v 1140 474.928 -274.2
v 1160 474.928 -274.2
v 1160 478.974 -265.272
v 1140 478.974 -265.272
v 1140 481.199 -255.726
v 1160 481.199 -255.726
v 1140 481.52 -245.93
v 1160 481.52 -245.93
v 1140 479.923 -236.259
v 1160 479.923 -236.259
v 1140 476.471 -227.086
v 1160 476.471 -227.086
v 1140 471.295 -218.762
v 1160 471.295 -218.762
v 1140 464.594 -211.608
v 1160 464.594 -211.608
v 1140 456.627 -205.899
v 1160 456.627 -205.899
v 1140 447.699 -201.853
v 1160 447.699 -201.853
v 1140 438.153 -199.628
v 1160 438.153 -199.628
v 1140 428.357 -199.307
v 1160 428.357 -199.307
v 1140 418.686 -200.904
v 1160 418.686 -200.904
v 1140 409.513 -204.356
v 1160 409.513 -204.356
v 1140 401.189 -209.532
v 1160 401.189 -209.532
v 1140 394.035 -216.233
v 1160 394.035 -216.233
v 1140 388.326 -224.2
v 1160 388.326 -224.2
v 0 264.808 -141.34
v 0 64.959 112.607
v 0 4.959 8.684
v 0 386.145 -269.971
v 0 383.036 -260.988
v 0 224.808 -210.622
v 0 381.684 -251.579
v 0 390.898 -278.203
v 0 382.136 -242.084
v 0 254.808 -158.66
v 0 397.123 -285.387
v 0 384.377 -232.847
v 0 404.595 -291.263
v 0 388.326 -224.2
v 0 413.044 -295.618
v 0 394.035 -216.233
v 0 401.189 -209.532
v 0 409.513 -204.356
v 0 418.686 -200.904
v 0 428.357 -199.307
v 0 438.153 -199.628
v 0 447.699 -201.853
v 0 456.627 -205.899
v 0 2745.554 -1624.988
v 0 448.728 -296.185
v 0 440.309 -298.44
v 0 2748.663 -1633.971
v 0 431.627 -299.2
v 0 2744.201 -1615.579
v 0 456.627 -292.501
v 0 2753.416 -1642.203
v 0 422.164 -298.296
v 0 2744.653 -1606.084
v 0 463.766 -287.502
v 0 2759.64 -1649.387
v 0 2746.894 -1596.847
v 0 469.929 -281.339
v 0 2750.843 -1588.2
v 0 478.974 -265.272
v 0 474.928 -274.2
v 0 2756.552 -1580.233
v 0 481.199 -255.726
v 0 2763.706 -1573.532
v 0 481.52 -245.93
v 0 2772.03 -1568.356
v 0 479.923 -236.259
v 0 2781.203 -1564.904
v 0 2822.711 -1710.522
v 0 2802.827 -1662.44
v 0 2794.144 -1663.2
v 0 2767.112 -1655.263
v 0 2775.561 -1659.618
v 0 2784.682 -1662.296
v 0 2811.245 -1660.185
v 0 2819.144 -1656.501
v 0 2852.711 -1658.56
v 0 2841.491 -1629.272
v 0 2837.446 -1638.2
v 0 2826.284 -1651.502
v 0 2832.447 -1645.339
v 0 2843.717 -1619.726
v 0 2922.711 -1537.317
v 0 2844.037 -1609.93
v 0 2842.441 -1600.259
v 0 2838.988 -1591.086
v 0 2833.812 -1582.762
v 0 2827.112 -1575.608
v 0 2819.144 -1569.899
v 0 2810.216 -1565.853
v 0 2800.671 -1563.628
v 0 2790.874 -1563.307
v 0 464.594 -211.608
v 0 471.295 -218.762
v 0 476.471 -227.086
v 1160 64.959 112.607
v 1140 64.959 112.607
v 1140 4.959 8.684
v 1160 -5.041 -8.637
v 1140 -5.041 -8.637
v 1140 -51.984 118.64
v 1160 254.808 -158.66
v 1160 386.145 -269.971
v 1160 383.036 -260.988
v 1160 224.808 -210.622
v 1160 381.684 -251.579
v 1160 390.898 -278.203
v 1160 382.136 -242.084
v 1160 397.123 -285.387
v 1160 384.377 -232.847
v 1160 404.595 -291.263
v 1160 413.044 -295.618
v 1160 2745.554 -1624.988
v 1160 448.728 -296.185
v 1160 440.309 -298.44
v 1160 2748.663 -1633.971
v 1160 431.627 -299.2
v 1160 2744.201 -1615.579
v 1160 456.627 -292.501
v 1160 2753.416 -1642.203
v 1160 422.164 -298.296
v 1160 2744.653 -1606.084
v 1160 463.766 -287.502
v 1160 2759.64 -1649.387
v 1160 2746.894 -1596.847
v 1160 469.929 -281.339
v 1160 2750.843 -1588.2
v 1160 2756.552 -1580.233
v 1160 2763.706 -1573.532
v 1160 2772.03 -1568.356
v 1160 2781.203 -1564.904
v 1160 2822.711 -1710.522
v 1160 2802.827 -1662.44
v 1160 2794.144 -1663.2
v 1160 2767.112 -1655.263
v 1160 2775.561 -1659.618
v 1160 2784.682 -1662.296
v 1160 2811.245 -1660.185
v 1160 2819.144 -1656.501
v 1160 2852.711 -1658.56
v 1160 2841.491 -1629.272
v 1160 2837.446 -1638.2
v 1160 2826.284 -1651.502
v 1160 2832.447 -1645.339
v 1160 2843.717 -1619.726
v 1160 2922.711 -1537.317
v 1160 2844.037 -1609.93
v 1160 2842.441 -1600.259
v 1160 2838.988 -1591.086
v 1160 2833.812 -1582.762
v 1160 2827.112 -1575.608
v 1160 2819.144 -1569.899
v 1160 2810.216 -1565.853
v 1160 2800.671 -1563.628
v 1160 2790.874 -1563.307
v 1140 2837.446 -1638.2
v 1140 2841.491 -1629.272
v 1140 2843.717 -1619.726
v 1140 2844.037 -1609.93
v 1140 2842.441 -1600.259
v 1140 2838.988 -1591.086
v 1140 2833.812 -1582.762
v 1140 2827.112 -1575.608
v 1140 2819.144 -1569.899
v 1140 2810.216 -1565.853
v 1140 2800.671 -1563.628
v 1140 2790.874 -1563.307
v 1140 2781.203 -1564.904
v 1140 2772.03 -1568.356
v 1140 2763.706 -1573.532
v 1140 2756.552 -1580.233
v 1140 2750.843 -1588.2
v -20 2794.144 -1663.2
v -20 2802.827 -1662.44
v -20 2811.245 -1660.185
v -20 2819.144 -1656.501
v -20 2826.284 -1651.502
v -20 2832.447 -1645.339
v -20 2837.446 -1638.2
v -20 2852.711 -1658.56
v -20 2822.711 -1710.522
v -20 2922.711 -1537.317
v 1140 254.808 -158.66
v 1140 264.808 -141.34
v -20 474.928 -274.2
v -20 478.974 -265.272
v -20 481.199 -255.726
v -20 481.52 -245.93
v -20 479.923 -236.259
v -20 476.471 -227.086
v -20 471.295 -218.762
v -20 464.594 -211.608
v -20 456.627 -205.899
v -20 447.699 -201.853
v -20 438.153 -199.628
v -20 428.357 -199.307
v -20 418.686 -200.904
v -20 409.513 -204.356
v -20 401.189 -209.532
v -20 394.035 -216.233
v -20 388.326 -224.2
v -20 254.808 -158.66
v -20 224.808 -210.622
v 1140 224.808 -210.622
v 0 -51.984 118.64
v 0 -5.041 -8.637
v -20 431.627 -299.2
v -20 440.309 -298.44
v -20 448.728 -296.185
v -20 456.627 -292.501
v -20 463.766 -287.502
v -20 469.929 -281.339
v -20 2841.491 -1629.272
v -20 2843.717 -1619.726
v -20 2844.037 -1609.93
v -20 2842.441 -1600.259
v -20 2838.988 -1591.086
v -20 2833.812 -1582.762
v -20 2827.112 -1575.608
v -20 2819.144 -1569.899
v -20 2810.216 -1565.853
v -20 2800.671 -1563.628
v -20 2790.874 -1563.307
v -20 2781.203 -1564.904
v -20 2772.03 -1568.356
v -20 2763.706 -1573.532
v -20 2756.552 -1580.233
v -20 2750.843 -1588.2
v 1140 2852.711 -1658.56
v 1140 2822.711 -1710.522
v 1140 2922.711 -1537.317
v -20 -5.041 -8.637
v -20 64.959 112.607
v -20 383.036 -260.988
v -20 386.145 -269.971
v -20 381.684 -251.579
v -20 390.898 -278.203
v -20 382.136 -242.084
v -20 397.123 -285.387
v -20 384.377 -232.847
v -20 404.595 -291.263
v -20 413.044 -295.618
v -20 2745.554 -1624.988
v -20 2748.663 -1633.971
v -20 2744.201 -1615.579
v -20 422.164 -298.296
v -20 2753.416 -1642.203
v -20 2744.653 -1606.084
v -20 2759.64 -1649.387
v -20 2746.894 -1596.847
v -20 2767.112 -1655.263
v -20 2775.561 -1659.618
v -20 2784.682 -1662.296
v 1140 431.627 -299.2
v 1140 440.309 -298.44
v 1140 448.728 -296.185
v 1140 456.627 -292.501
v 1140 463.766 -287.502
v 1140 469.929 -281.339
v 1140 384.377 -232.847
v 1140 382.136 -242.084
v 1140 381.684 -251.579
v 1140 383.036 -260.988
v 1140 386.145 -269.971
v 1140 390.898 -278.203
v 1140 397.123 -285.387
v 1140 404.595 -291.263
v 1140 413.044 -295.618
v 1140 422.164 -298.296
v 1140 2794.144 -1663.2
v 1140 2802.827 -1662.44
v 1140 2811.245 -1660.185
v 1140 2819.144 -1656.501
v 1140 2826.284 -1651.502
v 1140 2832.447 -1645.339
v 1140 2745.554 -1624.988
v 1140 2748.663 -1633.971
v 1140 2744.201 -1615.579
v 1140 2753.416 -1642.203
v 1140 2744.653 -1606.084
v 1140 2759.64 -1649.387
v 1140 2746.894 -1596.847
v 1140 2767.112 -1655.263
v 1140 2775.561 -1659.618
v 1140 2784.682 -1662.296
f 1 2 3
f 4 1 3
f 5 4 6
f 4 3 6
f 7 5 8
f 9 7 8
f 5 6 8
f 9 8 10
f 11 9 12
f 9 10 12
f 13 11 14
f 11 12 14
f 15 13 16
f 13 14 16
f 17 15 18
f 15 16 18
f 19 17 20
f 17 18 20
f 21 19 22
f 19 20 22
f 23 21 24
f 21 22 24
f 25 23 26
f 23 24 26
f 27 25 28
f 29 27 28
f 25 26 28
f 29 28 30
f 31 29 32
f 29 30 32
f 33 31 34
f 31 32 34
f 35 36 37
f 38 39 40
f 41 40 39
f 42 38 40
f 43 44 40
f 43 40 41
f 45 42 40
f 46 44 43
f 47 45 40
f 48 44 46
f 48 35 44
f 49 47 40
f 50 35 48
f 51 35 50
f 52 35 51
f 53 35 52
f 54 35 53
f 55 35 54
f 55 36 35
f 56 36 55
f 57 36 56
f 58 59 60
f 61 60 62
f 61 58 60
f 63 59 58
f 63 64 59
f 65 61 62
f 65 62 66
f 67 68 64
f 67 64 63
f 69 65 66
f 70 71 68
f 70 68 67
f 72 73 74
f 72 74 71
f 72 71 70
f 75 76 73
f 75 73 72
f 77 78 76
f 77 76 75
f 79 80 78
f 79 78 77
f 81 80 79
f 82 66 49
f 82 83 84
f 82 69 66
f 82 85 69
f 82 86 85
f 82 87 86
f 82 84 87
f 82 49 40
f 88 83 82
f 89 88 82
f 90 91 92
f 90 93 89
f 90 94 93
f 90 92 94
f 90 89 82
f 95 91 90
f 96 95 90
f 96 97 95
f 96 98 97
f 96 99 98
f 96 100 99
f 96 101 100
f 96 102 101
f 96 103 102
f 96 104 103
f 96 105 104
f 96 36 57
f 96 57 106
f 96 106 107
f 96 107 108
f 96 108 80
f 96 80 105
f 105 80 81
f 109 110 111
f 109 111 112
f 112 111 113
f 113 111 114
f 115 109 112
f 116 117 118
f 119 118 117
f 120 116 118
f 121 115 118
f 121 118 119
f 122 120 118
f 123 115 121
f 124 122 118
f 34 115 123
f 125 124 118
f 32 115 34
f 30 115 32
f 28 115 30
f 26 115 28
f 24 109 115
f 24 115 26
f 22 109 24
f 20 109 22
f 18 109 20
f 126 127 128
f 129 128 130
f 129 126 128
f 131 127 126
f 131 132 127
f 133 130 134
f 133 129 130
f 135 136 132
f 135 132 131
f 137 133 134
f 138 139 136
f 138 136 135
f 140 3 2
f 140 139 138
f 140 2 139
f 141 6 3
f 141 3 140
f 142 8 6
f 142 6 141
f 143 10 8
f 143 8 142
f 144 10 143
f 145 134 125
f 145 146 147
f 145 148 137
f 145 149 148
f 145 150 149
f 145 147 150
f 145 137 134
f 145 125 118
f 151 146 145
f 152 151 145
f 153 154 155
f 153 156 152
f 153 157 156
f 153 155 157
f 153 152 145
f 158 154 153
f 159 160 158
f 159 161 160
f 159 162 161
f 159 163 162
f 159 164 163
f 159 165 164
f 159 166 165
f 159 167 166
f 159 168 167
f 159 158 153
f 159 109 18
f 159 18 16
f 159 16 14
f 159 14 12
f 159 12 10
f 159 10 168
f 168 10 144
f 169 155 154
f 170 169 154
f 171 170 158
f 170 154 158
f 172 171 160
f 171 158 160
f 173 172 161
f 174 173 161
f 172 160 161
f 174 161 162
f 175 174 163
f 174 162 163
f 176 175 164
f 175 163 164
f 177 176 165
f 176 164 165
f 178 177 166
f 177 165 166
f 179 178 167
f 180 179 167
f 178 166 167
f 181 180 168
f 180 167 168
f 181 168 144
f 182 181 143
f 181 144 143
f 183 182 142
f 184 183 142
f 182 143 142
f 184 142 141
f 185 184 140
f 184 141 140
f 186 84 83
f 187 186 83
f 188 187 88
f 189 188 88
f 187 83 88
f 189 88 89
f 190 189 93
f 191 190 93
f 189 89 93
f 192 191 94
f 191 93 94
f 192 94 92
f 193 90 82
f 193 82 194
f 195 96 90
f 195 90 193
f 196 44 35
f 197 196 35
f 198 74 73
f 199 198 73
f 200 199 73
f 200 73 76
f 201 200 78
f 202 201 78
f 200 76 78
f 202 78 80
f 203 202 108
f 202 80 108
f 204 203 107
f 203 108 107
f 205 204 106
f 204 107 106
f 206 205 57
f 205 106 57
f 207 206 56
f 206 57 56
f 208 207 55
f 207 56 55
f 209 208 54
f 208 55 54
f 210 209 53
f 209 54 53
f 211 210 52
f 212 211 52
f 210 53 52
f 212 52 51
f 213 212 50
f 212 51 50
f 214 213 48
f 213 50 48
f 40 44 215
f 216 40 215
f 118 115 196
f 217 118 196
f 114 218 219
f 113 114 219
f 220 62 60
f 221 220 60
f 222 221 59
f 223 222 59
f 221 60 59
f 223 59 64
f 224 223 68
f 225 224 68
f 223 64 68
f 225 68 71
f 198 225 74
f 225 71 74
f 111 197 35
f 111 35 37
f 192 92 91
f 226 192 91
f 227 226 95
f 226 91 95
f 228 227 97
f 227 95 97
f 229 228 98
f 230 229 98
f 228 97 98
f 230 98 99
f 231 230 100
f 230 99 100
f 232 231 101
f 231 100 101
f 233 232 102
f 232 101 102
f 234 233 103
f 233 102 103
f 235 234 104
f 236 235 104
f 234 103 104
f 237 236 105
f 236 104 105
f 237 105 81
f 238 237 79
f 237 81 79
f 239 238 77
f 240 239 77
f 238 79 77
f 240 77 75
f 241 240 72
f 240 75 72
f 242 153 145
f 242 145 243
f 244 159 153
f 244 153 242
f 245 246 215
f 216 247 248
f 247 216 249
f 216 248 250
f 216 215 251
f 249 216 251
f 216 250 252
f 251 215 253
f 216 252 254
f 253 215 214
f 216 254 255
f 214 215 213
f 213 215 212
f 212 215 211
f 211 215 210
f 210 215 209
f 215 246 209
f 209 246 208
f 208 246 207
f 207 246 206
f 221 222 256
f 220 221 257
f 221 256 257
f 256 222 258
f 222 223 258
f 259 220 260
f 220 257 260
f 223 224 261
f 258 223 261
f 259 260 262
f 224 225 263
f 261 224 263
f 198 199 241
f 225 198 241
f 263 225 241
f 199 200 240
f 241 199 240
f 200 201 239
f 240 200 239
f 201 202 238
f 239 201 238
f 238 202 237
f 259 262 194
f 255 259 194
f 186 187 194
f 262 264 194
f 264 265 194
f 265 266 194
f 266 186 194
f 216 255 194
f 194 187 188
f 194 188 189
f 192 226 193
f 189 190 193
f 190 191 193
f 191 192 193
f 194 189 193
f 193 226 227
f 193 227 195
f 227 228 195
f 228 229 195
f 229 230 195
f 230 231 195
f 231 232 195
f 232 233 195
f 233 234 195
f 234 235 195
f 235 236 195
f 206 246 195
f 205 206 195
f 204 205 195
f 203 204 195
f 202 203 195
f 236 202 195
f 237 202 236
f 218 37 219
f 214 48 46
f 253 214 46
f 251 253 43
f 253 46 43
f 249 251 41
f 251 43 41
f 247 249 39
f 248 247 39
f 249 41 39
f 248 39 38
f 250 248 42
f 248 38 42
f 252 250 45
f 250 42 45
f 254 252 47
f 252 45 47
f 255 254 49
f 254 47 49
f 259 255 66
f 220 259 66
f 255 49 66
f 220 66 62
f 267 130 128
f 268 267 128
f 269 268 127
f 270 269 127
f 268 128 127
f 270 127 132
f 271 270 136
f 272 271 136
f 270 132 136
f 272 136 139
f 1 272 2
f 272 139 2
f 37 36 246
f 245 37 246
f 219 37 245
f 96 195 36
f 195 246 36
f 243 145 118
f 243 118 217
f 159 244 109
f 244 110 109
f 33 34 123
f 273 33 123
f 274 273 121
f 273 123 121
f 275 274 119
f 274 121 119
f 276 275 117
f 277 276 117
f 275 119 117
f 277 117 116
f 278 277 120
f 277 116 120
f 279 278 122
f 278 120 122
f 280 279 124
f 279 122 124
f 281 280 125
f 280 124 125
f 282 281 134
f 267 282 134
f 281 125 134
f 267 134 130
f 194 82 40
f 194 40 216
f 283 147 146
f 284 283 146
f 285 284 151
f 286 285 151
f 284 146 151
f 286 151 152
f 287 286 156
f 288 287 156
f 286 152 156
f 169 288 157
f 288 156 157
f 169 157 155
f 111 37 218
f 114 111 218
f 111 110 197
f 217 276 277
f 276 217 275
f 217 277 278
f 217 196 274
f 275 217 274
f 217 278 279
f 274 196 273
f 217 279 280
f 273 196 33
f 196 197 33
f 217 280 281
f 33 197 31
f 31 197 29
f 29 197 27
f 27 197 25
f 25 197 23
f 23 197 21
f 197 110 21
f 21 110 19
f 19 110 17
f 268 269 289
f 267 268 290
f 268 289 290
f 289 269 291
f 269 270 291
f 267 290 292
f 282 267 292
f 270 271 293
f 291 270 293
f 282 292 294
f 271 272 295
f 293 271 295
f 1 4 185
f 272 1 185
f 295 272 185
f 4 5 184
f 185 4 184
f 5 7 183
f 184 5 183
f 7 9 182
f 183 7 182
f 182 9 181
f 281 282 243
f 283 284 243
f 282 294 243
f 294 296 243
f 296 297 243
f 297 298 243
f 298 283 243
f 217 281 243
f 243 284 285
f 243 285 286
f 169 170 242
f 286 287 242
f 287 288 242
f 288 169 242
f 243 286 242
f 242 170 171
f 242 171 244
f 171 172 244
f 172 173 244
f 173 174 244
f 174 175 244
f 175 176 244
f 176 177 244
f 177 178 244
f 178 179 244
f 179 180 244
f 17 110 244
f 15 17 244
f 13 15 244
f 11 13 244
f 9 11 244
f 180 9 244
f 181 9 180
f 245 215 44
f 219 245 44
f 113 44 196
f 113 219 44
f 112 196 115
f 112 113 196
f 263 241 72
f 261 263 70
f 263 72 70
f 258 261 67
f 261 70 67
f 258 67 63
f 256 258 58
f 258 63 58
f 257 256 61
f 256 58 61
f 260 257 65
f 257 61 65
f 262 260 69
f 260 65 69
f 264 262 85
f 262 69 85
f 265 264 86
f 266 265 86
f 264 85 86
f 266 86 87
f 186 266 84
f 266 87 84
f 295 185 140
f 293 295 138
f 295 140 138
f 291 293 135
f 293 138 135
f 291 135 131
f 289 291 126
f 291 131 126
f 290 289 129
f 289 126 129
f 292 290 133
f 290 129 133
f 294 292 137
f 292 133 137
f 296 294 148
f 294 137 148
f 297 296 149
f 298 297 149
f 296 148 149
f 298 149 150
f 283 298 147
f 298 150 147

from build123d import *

# Parameters (mm, degrees)
BOSS_EXTRUDE1_DEPTH = 1140
BOSS_EXTRUDE2_DEPTH = 20
BOSS_EXTRUDE3_DEPTH = 20
SKETCH4_W           = 20
SKETCH4_H           = 140
BOSS_EXTRUDE4_DEPTH = 2999.8
SKETCH5_W           = 20
SKETCH5_H           = 140
BOSS_EXTRUDE5_DEPTH = 2999.8
SKETCH7_W           = 20
SKETCH7_H           = 2999.8
BOSS_EXTRUDE6_DEPTH = 60
SKETCH8_W           = 20
SKETCH8_H           = 2999.8
BOSS_EXTRUDE7_DEPTH = 60
CUT_EXTRUDE3_DEPTH  = 3587.157019078


with BuildPart() as part:
    # Sketch1 → Boss-Extrude1 (new body)
    with BuildSketch(Plane(origin=(0, 0, 0), x_dir=(0, 0, -1), z_dir=(1, 0, 0))):
        Polygon((158.660254038, 254.807621135), (141.339745962, 264.807621135), (-8.683943562, 4.958968541), (-118.640466011, -51.98357266), (8.636564514, -5.041031459), align=None)
    extrude(amount=BOSS_EXTRUDE1_DEPTH)

    # Sketch2 → Boss-Extrude2 (add)
    with BuildSketch(Plane(origin=(1140, 0, 0), x_dir=(0, 0, -1), z_dir=(1, 0, 0))):
        Polygon((8.636564514, -5.041031459), (158.660254038, 254.807621135), (37.416697508, 324.807621135), (-112.606992016, 64.958968541), align=None)
    extrude(amount=BOSS_EXTRUDE2_DEPTH)

    # Sketch3 → Boss-Extrude3 (add)
    with BuildSketch(Plane.ZY):
        Polygon((-158.660254038, 254.807621135), (-37.416697508, 324.807621135), (112.606992016, 64.958968541), (-8.636564514, -5.041031459), align=None)
    extrude(amount=BOSS_EXTRUDE3_DEPTH)

    # Sketch4 → Boss-Extrude4 (add)
    with BuildSketch(Plane(origin=(0, 259.807621135, -150), x_dir=(1, 0, 0), z_dir=(0, 0.8660254037844397, -0.4999999999999983))):
        with Locations((1150, -60)):
            Rectangle(SKETCH4_W, SKETCH4_H)
    extrude(amount=BOSS_EXTRUDE4_DEPTH)

    # Sketch5 → Boss-Extrude5 (add)
    with BuildSketch(Plane(origin=(0, 259.807621135, -150), x_dir=(1, 0, 0), z_dir=(0, 0.8660254037844396, -0.4999999999999982))):
        with Locations((-10, -60)):
            Rectangle(SKETCH5_W, SKETCH5_H)
    extrude(amount=BOSS_EXTRUDE5_DEPTH)

    # Sketch7 → Boss-Extrude6 (add)
    with BuildSketch(Plane(origin=(0, -5, -8.660254038), x_dir=(-1, 0, 0), z_dir=(0, -0.49999999999999756, -0.86602540378444))):
        with Locations((-1150, 1799.9)):
            Rectangle(SKETCH7_W, SKETCH7_H)
    extrude(amount=BOSS_EXTRUDE6_DEPTH)

    # Sketch8 → Boss-Extrude7 (add)
    with BuildSketch(Plane(origin=(0, -5, -8.660254038), x_dir=(-1, 0, 0), z_dir=(0, -0.49999999999999756, -0.86602540378444))):
        with Locations((10, 1799.9)):
            Rectangle(SKETCH8_W, SKETCH8_H)
    extrude(amount=BOSS_EXTRUDE7_DEPTH)

    # Sketch10 → Cut-Extrude3 (cut, through all)
    with BuildSketch(Plane(origin=(1160, 0, 0), x_dir=(0, 0, -1), z_dir=(1, 0, 0))):
        with BuildLine():
            ThreePointArc((274.2, 474.928331435), (205.898729811, 456.627061246), (224.2, 388.325791057))
            Line((224.2, 388.325791057), (274.2, 474.928331435))
        make_face()
        with BuildLine():
            Line((274.2, 474.928331435), (224.2, 388.325791057))
            ThreePointArc((224.2, 388.325791057), (274.2, 388.325791057), (299.2, 431.627061246))
            ThreePointArc((299.2, 431.627061246), (292.501270189, 456.627061246), (274.2, 474.928331435))
        make_face()
        with BuildLine():
            ThreePointArc((1638.2, 2837.445632959), (1569.898729811, 2819.14436277), (1588.2, 2750.843092581))
            Line((1588.2, 2750.843092581), (1638.2, 2837.445632959))
        make_face()
        with BuildLine():
            Line((1638.2, 2837.445632959), (1588.2, 2750.843092581))
            ThreePointArc((1588.2, 2750.843092581), (1638.2, 2750.843092581), (1663.2, 2794.14436277))
            ThreePointArc((1663.2, 2794.14436277), (1656.501270189, 2819.14436277), (1638.2, 2837.445632959))
        make_face()
    extrude(amount=-CUT_EXTRUDE3_DEPTH, mode=Mode.SUBTRACT)


solid = part.part
